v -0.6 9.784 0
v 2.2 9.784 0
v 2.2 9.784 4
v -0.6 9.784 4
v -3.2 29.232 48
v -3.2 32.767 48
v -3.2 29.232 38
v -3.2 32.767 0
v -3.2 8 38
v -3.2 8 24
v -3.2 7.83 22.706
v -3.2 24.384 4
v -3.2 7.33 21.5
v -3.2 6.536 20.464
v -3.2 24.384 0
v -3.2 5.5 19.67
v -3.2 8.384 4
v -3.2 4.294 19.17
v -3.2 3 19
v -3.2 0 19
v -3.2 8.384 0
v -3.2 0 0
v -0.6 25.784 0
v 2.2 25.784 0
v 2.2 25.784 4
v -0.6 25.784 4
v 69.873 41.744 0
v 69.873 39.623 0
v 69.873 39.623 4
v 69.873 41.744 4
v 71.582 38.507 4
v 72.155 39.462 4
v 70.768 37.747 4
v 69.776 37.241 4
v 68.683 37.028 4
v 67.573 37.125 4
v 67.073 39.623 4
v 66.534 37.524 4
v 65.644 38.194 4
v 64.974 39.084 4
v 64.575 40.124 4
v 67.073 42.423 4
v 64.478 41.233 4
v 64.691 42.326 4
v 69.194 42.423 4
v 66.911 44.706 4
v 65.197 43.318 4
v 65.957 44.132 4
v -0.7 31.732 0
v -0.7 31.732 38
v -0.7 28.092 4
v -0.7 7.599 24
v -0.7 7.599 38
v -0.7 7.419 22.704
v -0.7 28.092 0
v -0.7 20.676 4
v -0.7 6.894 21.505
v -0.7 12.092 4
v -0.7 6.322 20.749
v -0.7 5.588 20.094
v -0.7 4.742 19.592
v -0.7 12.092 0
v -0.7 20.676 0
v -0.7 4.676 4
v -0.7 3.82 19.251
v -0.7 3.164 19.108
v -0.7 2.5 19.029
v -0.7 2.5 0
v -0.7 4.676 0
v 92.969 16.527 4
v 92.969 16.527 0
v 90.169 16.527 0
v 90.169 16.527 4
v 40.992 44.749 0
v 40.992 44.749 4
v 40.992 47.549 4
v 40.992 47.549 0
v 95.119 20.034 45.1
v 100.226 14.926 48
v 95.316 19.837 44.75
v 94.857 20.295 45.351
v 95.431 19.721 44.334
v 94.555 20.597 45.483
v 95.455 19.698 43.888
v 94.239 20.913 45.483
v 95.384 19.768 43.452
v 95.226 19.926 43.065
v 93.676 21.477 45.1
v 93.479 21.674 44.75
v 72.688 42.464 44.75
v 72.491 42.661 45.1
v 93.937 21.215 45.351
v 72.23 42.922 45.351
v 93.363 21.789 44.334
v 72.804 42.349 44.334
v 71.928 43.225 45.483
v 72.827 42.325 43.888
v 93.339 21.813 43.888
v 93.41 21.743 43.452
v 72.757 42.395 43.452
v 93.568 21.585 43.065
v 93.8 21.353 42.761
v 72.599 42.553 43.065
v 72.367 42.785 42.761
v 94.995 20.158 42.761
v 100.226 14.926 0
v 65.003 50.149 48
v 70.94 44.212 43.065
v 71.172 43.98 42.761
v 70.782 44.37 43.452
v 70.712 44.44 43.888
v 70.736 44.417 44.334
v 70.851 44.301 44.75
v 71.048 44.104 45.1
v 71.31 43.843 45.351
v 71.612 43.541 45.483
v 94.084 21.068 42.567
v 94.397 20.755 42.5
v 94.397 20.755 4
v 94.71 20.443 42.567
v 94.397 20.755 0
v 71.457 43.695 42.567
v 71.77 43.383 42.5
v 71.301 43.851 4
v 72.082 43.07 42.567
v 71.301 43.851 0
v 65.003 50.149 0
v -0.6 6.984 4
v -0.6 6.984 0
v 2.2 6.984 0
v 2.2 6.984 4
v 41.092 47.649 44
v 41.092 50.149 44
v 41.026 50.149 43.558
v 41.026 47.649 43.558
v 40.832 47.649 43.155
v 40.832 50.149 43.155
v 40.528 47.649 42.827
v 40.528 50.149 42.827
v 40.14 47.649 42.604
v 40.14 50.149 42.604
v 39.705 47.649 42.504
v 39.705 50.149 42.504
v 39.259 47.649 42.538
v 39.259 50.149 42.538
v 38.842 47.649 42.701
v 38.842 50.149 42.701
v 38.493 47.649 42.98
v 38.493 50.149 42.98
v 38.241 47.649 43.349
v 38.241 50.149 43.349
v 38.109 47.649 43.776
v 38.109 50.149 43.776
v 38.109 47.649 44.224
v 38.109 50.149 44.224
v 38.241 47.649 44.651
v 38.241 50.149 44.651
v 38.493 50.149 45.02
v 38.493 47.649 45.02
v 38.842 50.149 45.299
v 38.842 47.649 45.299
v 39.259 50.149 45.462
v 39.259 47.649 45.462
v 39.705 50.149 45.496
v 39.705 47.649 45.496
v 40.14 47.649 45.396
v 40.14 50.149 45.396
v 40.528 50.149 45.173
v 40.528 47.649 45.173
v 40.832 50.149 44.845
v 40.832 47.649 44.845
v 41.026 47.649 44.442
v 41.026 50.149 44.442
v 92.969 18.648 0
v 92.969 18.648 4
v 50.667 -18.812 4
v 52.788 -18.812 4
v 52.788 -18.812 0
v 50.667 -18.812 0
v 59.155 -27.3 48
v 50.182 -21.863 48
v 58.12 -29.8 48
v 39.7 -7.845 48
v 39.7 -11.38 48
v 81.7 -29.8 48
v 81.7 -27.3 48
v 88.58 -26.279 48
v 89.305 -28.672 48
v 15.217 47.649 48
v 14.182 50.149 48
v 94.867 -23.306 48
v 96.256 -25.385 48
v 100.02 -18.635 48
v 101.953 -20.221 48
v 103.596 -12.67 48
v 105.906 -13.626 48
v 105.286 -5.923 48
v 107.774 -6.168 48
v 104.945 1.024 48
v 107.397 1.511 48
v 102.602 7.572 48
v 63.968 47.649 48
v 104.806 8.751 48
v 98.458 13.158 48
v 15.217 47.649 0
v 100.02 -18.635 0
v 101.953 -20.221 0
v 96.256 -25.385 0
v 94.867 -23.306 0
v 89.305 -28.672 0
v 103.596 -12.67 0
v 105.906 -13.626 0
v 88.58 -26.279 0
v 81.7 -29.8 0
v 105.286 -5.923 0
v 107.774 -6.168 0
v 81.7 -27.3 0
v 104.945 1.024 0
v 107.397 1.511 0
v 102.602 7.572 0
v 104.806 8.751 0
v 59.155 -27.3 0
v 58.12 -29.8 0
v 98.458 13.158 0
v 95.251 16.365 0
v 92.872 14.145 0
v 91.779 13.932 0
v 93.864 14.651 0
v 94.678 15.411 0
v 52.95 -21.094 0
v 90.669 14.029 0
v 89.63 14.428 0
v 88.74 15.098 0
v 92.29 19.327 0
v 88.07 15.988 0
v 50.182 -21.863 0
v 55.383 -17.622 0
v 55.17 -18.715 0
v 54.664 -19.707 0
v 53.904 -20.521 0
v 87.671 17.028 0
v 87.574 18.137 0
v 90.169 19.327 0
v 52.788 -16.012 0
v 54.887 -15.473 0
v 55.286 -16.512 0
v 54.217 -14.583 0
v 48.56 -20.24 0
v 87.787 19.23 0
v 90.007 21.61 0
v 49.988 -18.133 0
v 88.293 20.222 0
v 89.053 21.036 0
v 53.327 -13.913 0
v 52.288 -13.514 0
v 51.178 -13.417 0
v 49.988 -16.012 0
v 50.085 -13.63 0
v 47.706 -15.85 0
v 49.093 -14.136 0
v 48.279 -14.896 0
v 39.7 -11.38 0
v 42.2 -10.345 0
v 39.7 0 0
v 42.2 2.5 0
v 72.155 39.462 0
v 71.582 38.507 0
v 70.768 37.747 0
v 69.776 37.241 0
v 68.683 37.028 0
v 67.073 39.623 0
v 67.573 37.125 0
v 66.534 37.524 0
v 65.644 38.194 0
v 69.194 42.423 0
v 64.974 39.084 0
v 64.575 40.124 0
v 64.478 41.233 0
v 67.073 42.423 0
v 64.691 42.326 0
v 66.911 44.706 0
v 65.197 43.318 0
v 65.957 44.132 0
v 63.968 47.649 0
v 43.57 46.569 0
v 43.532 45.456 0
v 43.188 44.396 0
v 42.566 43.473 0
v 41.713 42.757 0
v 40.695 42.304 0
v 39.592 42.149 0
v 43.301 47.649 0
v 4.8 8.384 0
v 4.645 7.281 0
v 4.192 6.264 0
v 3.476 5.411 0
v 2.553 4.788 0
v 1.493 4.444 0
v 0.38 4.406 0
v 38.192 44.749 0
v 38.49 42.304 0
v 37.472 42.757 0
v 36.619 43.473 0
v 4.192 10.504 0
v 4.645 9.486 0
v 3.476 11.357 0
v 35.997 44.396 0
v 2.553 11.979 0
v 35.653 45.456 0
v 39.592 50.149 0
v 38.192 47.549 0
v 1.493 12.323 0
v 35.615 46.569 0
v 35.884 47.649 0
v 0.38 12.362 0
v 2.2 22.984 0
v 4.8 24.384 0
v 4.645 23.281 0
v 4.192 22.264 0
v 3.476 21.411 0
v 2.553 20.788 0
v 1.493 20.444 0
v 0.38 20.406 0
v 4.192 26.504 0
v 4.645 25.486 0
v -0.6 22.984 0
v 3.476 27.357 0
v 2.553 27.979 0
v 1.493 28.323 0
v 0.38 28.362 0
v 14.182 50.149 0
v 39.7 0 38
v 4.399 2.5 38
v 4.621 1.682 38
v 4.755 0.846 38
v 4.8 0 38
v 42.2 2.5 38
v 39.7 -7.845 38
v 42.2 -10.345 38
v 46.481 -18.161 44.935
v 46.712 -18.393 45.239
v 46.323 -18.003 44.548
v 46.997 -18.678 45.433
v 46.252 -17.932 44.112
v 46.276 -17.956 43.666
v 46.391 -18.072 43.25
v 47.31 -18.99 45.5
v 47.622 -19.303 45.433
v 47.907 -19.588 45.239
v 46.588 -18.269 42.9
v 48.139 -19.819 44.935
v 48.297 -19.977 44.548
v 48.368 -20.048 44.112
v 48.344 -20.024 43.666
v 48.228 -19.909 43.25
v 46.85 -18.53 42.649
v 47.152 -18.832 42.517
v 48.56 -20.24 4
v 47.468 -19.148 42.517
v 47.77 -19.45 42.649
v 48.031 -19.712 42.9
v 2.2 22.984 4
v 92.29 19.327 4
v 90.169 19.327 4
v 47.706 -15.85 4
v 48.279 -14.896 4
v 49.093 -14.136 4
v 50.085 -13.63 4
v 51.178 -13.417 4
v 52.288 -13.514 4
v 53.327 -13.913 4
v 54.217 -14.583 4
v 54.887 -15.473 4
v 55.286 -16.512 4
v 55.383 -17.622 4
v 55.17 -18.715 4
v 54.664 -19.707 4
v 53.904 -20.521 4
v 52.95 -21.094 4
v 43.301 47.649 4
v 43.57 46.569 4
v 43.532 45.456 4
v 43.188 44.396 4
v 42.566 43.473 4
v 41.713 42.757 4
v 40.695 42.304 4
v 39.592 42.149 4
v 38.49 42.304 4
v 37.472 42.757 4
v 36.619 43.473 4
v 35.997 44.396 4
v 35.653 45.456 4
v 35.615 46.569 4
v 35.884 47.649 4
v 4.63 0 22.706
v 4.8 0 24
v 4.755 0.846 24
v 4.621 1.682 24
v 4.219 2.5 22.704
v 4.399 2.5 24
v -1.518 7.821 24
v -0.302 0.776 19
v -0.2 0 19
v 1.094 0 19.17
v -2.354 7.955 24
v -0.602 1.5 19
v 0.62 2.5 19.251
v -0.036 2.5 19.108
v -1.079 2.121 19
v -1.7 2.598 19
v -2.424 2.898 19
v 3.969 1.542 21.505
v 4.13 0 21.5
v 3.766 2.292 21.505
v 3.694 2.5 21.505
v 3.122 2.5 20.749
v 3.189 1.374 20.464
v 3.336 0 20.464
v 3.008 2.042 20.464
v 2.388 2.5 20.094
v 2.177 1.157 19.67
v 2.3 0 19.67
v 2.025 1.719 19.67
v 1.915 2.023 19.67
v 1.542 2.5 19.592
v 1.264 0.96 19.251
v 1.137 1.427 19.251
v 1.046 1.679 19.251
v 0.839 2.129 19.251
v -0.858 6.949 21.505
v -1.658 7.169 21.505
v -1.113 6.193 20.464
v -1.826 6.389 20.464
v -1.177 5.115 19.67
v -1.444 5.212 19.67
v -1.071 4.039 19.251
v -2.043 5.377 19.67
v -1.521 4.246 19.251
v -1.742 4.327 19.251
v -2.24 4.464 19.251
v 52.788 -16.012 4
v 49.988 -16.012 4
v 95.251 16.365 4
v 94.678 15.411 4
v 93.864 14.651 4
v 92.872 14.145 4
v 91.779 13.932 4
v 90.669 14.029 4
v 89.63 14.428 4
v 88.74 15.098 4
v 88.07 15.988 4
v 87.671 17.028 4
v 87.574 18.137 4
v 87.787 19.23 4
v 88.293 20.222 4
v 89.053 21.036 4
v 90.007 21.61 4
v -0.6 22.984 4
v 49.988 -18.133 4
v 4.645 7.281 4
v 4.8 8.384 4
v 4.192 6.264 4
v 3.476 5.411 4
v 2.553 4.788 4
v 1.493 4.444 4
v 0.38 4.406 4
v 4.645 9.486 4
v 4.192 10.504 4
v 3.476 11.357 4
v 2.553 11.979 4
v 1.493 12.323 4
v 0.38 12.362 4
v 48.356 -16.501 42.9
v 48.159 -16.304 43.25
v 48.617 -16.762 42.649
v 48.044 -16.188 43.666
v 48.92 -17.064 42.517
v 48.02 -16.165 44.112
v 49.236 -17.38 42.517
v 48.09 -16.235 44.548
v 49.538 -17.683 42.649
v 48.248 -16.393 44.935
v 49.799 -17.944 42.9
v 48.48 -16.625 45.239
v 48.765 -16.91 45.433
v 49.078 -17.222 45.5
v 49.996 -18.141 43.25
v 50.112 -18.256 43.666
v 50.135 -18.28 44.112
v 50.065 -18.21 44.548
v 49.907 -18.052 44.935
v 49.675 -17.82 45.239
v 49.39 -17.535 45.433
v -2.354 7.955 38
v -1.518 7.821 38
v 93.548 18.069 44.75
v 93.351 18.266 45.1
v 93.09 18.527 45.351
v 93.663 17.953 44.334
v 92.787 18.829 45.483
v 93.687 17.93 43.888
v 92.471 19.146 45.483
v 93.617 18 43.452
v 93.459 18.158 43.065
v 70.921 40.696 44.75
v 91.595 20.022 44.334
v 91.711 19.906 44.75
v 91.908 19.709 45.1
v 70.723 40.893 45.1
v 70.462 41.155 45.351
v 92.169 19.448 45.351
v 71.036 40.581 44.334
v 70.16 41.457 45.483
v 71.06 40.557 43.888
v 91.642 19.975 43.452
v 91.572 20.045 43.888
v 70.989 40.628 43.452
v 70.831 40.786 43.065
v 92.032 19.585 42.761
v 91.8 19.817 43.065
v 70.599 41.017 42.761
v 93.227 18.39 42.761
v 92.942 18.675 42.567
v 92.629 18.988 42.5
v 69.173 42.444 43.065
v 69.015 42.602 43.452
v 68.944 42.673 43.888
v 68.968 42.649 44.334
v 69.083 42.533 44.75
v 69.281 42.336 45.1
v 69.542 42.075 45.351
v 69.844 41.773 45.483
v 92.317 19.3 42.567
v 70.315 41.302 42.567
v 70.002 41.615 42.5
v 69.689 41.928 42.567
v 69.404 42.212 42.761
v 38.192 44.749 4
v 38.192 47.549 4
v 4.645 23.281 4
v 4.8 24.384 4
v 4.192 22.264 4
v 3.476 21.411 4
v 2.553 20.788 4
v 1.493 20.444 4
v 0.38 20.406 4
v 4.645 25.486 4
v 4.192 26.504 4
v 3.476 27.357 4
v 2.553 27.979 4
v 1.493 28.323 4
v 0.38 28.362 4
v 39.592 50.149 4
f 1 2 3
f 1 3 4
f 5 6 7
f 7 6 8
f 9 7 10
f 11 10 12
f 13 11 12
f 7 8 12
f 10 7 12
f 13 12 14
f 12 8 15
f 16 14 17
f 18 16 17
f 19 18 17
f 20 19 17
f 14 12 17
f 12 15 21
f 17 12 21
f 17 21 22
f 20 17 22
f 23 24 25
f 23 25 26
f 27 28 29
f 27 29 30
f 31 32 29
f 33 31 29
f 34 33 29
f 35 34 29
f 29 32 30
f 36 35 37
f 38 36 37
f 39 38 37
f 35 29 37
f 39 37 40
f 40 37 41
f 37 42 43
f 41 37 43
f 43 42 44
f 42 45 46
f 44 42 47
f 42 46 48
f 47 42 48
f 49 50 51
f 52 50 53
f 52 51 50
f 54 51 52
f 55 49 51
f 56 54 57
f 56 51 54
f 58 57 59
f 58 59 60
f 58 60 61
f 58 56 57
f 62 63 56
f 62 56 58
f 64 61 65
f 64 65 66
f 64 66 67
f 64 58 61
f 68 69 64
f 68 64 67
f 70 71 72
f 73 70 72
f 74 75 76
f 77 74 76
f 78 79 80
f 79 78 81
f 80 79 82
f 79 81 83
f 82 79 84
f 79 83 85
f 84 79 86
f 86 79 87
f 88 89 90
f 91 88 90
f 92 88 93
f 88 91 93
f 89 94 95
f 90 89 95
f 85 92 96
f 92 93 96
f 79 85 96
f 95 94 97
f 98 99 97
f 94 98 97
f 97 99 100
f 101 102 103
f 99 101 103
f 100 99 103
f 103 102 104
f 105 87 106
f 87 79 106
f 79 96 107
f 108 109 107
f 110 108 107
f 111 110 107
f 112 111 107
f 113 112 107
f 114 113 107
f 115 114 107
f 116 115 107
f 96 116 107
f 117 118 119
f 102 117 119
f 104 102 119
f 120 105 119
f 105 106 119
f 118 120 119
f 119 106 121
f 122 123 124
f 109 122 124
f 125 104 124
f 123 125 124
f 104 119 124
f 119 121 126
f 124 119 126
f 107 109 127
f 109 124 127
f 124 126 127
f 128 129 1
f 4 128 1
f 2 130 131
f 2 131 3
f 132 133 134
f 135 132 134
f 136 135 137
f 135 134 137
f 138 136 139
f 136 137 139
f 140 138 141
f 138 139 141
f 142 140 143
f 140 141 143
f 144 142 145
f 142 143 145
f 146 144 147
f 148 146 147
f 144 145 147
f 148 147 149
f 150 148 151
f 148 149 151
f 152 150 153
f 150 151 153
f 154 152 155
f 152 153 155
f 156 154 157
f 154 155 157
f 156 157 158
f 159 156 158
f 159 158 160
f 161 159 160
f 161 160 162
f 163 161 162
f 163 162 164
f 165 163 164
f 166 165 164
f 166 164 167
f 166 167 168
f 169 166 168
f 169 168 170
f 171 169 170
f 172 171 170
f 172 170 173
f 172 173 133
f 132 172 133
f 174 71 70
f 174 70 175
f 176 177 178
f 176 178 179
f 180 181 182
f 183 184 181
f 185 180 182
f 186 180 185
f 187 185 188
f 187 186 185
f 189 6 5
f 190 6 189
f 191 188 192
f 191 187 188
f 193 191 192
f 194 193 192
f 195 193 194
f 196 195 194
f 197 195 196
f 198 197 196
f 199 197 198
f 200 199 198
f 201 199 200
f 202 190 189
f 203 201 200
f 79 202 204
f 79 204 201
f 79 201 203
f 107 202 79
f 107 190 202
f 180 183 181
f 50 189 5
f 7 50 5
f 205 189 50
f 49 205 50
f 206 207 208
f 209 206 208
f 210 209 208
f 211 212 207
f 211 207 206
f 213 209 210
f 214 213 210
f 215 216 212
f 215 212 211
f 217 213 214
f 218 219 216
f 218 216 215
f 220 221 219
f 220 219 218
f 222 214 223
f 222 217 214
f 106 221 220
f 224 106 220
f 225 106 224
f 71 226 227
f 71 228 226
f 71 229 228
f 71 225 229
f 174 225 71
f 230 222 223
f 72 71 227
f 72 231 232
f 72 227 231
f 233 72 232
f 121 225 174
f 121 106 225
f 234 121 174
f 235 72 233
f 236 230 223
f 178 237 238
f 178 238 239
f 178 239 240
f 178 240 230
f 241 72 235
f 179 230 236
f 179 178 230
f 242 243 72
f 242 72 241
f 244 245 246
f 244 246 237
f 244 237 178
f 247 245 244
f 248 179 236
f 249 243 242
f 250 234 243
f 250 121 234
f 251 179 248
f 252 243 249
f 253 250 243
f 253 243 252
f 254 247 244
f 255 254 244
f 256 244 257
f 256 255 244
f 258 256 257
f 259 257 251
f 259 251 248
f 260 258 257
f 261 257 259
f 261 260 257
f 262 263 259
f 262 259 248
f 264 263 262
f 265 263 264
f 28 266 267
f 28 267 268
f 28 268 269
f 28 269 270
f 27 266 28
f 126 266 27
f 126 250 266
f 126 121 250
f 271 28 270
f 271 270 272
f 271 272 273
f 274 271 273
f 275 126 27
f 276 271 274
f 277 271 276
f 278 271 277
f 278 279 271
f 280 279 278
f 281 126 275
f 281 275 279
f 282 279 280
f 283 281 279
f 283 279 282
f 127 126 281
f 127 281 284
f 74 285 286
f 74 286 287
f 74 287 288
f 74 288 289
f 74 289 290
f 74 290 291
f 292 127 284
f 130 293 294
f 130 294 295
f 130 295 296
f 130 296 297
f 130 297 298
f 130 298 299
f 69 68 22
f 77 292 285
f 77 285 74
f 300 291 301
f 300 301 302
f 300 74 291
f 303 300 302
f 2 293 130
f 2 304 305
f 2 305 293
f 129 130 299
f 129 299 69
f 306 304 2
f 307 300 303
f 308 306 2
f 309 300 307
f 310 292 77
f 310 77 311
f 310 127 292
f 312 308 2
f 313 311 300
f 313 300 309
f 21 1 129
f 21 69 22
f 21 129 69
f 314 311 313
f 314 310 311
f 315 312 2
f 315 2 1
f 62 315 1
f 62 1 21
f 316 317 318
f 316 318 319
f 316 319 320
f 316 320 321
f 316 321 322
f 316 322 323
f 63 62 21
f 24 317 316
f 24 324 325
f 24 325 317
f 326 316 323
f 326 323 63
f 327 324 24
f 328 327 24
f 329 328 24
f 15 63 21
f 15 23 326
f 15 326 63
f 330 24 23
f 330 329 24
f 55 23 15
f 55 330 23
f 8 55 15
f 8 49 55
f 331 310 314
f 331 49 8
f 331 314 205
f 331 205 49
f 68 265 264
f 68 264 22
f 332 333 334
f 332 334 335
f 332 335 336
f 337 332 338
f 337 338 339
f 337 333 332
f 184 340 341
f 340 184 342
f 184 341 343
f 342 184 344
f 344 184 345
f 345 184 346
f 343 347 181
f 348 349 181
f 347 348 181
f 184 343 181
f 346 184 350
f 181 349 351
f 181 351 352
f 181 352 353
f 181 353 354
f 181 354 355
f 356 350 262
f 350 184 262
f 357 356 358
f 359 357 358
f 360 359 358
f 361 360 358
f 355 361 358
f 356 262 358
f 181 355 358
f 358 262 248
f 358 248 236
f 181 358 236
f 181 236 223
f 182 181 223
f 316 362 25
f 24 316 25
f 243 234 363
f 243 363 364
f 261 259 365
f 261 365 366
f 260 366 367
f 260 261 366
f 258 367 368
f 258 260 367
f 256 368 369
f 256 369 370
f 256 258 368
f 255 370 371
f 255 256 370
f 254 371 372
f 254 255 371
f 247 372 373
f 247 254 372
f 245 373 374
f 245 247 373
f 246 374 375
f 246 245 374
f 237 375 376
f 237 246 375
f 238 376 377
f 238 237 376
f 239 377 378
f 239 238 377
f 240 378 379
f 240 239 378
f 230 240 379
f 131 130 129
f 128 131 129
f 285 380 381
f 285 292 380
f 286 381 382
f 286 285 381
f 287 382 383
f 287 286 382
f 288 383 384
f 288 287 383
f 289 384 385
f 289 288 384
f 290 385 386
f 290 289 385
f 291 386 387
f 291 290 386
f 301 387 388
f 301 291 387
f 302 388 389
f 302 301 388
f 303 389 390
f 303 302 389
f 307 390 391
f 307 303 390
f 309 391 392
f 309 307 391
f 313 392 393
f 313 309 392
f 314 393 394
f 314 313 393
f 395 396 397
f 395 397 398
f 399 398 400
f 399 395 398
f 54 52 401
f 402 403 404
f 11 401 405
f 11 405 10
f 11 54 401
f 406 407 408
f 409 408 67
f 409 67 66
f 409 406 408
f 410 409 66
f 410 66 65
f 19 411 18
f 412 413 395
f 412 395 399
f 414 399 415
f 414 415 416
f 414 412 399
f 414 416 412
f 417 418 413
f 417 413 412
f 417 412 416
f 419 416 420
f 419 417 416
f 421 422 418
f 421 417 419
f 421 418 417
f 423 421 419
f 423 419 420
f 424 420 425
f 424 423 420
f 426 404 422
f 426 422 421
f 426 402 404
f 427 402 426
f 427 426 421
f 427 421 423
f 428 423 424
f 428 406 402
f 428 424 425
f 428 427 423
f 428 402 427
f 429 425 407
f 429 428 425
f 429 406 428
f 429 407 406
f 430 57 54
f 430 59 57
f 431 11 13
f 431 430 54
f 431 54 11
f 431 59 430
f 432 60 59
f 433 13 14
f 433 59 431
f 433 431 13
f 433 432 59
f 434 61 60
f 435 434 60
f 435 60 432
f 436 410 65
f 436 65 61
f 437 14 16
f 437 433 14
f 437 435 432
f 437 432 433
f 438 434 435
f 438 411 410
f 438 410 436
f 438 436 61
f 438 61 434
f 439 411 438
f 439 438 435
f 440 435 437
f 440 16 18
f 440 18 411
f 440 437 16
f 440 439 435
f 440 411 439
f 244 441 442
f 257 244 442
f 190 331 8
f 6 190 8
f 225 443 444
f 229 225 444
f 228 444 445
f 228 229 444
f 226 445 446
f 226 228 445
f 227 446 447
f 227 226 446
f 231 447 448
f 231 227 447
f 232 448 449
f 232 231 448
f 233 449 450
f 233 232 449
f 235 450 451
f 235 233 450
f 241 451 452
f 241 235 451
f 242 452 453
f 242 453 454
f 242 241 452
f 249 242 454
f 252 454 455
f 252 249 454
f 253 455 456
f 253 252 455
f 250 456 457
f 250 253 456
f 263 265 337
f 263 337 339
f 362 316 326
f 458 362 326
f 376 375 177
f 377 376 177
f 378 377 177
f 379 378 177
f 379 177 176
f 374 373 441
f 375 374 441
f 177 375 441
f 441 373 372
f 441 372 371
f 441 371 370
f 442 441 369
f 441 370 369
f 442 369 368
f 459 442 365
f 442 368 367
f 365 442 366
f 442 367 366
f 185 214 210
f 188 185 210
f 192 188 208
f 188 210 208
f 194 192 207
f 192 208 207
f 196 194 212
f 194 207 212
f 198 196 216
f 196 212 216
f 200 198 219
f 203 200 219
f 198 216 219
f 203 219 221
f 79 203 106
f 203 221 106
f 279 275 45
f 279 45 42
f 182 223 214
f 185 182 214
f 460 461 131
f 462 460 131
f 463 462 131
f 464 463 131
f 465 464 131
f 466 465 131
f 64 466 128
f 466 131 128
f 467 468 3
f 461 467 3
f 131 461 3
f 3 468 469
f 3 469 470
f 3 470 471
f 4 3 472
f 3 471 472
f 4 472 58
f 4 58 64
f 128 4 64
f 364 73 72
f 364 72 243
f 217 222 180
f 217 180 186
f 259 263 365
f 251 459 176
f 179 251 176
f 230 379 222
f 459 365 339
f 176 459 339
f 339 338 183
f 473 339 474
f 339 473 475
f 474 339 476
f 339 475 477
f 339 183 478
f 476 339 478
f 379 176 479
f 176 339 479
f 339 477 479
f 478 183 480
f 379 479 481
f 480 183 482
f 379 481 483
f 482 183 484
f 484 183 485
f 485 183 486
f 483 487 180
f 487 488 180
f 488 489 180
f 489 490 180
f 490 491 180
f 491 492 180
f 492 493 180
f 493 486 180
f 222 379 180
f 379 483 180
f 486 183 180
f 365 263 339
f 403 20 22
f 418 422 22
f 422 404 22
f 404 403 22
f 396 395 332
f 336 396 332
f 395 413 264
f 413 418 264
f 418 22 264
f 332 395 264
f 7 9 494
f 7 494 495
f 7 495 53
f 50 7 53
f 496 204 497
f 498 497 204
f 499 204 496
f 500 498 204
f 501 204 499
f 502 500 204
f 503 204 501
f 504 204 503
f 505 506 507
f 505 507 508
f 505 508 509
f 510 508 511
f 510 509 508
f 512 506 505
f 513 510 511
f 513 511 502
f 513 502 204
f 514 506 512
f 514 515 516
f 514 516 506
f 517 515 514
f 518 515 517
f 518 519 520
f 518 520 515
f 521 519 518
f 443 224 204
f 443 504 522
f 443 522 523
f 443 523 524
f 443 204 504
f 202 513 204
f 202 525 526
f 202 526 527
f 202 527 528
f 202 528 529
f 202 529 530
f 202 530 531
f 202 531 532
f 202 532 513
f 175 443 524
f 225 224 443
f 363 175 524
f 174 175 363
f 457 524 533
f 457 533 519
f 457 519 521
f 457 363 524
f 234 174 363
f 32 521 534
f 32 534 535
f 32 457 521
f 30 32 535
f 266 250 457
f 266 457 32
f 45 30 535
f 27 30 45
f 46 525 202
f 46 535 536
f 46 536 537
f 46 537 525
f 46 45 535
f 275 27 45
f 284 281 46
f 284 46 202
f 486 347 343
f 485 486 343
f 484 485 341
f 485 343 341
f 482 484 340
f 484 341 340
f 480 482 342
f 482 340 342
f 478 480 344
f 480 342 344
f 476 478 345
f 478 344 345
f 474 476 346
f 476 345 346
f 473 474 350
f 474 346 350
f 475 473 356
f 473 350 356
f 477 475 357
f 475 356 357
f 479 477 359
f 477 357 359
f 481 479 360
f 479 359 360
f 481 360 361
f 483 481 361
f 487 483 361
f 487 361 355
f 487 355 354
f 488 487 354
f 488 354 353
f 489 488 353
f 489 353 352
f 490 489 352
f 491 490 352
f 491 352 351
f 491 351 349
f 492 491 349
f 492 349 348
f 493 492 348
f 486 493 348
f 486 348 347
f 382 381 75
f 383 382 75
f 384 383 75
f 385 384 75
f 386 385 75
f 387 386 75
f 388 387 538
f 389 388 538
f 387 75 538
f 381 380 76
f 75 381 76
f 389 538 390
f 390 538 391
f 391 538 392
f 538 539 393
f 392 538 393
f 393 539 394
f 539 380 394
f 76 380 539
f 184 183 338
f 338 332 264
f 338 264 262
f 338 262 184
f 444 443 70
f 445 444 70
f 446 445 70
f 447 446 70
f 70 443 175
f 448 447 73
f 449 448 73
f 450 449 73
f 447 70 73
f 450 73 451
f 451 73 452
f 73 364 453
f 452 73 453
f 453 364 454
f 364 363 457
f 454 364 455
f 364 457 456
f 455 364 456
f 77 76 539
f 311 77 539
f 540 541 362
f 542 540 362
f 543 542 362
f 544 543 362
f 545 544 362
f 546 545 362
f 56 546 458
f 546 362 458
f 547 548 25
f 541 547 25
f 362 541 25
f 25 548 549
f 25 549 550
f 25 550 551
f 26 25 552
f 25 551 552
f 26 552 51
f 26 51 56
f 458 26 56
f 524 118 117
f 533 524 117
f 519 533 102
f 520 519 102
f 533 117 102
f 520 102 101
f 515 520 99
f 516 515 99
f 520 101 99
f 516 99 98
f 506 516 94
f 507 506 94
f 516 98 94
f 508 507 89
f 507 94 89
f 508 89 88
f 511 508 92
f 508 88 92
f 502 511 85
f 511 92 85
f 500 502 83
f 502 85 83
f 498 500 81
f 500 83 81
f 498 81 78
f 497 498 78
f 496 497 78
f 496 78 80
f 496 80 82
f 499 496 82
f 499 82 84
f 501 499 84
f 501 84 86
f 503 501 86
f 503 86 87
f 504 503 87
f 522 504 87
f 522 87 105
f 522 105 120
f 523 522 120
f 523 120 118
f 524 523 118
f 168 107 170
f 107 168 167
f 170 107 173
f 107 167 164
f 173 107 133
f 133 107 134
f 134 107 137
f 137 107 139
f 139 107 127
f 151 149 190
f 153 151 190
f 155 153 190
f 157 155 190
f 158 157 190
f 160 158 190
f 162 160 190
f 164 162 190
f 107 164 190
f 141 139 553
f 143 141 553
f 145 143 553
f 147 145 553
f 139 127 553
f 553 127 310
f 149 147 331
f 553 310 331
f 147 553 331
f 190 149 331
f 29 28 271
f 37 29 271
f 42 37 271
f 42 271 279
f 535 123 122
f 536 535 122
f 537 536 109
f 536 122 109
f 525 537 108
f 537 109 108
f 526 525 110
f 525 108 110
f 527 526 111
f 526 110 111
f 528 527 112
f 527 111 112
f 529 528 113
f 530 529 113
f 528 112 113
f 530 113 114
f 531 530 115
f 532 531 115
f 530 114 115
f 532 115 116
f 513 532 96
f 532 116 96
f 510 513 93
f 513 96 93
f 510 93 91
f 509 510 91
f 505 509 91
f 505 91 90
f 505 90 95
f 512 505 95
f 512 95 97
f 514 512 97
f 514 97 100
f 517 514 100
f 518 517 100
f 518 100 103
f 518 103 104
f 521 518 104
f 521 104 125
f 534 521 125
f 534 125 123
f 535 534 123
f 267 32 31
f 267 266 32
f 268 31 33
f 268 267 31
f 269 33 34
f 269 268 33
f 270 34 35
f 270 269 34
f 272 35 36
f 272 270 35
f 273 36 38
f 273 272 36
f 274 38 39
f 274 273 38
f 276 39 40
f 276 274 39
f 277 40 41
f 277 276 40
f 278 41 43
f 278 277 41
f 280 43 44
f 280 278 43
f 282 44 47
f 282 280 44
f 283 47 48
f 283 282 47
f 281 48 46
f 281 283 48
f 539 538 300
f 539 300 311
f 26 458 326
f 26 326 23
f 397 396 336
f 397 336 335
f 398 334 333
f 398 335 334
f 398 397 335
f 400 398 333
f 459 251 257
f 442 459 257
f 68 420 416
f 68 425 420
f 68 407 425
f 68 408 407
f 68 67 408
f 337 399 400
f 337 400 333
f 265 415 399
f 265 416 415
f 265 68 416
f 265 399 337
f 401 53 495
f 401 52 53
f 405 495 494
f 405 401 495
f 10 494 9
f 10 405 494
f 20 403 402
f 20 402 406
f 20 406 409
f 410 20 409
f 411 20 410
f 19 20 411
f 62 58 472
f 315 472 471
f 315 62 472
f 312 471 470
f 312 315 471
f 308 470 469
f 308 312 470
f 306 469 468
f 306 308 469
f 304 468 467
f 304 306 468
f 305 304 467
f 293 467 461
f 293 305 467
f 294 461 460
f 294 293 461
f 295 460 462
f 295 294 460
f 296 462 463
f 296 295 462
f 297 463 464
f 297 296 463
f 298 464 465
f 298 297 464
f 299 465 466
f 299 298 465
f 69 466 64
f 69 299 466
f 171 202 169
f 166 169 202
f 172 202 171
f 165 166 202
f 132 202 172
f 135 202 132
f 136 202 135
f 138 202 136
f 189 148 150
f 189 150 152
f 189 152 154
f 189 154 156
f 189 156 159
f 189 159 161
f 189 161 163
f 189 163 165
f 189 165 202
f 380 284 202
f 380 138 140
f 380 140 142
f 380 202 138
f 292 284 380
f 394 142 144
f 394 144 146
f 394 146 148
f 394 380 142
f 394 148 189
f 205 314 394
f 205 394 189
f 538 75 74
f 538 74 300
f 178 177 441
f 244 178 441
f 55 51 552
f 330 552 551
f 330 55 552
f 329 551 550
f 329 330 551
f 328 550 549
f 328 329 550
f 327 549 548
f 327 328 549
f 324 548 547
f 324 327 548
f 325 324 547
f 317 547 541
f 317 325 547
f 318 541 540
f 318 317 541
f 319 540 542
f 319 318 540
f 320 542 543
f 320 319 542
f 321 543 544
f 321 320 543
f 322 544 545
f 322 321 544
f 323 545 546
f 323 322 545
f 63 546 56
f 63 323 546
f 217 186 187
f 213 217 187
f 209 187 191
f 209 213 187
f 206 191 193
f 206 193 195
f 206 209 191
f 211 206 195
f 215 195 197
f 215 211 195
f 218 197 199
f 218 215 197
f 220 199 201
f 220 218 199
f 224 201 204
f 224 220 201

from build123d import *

# Parameters (mm, degrees)
RESSALTO_EXTRUS_O1_DEPTH = 48
ESBO_O12_R               = 1.5
CORTE_EXTRUS_O10_DEPTH   = 10
ESBO_O13_R               = 1.5
CORTE_EXTRUS_O11_DEPTH   = 10
ESBO_O14_R               = 1.5
CORTE_EXTRUS_O12_DEPTH   = 10
ESBO_O15_R               = 1.5
CORTE_EXTRUS_O13_DEPTH   = 10
CORTE_EXTRUS_O14_DEPTH   = 10
ESBO_O17_R               = 4
ESBO_O17_W               = 2.8
ESBO_O17_H               = 2.8
RESSALTO_EXTRUS_O2_DEPTH = 4
CORTE_EXTRUS_O15_DEPTH   = 10


with BuildPart() as part:
    # Model → Ressalto-extrusão1 (new body)
    with BuildSketch(Plane.XY):
        with BuildLine():
            Line((-0.7, 0), (39, 0))
            Line((39, 0), (39.7, 0))
            Line((39.7, 0), (39.7, -11.380317396))
            Line((39.7, -11.380317396), (50.182424304, -21.8627417))
            Line((50.182424304, -21.8627417), (58.119682605, -29.8))
            Line((58.119682605, -29.8), (81.7, -29.8))
            ThreePointArc((81.7, -29.8), (105.905643752, -13.626305928), (100.226197667, 14.926197667))
            Line((100.226197667, 14.926197667), (65.00338056, 50.149014774))
            Line((65.00338056, 50.149014774), (50.111140335, 50.149014774))
            Line((50.111140335, 50.149014774), (14.181595121, 50.149014774))
            Line((14.181595121, 50.149014774), (-3.2, 32.767419653))
            Line((-3.2, 32.767419653), (-3.2, 5))
            Line((-3.2, 5), (-3.2, 0))
            Line((-3.2, 0), (-0.7, 0))
        make_face()
        with BuildLine():
            Line((-0.7, 2.5), (39, 2.5))
            Line((39, 2.5), (39.7, 2.5))
            Line((39.7, 2.5), (42.2, 2.5))
            Line((42.2, 2.5), (42.2, -10.34478349))
            Line((42.2, -10.34478349), (51.950191257, -20.094974747))
            Line((51.950191257, -20.094974747), (59.15521651, -27.3))
            Line((59.15521651, -27.3), (81.7, -27.3))
            ThreePointArc((81.7, -27.3), (103.595944921, -12.669597347), (98.458430714, 13.158430714))
            Line((98.458430714, 13.158430714), (63.967846654, 47.649014774))
            Line((63.967846654, 47.649014774), (50.111140335, 47.649014774))
            Line((50.111140335, 47.649014774), (15.217129027, 47.649014774))
            Line((15.217129027, 47.649014774), (-0.7, 31.731885747))
            Line((-0.7, 31.731885747), (-0.7, 2.5))
        make_face(mode=Mode.SUBTRACT)
    extrude(amount=RESSALTO_EXTRUS_O1_DEPTH)

    # Esboço12 → Corte-extrusão10 (cut)
    with BuildSketch(Plane(origin=(57.576197667, 57.576197667, 0), x_dir=(0, 0, -1), z_dir=(0.707106781, 0.707106781, 0))):
        with Locations((-44, -20.072657306)):
            Circle(ESBO_O12_R)
        with Locations((-44, -52.072657306)):
            Circle(ESBO_O12_R)
    extrude(amount=-CORTE_EXTRUS_O10_DEPTH, mode=Mode.SUBTRACT)

    # Esboço13 → Corte-extrusão11 (cut)
    with BuildSketch(Plane(origin=(0, 50.149014774, 0), x_dir=(1, 0, 0), z_dir=(0, 1, 0))):
        with Locations((39.59248784, -44)):
            Circle(ESBO_O13_R)
    extrude(amount=-CORTE_EXTRUS_O11_DEPTH, mode=Mode.SUBTRACT)

    # Esboço14 → Corte-extrusão12 (cut)
    with BuildSketch(Plane.ZY.offset(3.2)):
        with Locations((44, 23.701037279)):
            Circle(ESBO_O14_R)
        with Locations((44, 7.740898975)):
            Circle(ESBO_O14_R)
    extrude(amount=-CORTE_EXTRUS_O12_DEPTH, mode=Mode.SUBTRACT)

    # Esboço15 → Corte-extrusão13 (cut)
    with BuildSketch(Plane(origin=(14.159841302, 14.159841302, 0), x_dir=(0, 0, 1), z_dir=(-0.707106781, -0.707106781, 0))):
        with Locations((44, -46.881179593)):
            Circle(ESBO_O15_R)
    extrude(amount=-CORTE_EXTRUS_O13_DEPTH, mode=Mode.SUBTRACT)

    # Esboço16 → Corte-extrusão14 (cut)
    with BuildSketch(Plane.XY.offset(48)):
        Polygon((39.7, 0), (39.7, -7.84478349), (42.2, -10.34478349), (42.2, 2.5), (-0.7, 2.5), (-0.7, 0), align=None)
    extrude(amount=-CORTE_EXTRUS_O14_DEPTH, mode=Mode.SUBTRACT)

    # Esboço17 → Ressalto-extrusão2 (add)
    with BuildSketch(Plane(origin=(0, 0, 0), x_dir=(-1, 0, 0), z_dir=(0, 0, -1))):
        with Locations((-91.568699638, 17.926841447)):
            Circle(ESBO_O17_R)
        with Locations((-91.568699638, 17.926841447)):
            Rectangle(ESBO_O17_W, ESBO_O17_H, mode=Mode.SUBTRACT)
        with Locations((-68.47265349, 41.022887595)):
            Circle(ESBO_O17_R)
        with Locations((-68.47265349, 41.022887595)):
            Rectangle(ESBO_O17_W, ESBO_O17_H, mode=Mode.SUBTRACT)
        with Locations((-39.59248784, 46.149014774)):
            Circle(ESBO_O17_R)
        with Locations((-39.59248784, 46.149014774)):
            Rectangle(ESBO_O17_W, ESBO_O17_H, mode=Mode.SUBTRACT)
        with Locations((-0.8, 24.383709827)):
            Circle(ESBO_O17_R)
        with Locations((-0.8, 24.383709827)):
            Rectangle(ESBO_O17_W, ESBO_O17_H, mode=Mode.SUBTRACT)
        with Locations((-0.8, 8.383709827)):
            Circle(ESBO_O17_R)
        with Locations((-0.8, 8.383709827)):
            Rectangle(ESBO_O17_W, ESBO_O17_H, mode=Mode.SUBTRACT)
        with Locations((-51.388268427, -17.411731573)):
            Circle(ESBO_O17_R)
        with Locations((-51.388268427, -17.411731573)):
            Rectangle(ESBO_O17_W, ESBO_O17_H, mode=Mode.SUBTRACT)
    extrude(amount=-RESSALTO_EXTRUS_O2_DEPTH)

    # Esboço18 → Corte-extrusão15 (cut)
    with BuildSketch(Plane.XY.offset(48)):
        Polygon((-0.7, 31.731885747), (-32.431885747, 0), (-0.7, 0), align=None)
    extrude(amount=-CORTE_EXTRUS_O15_DEPTH, mode=Mode.SUBTRACT)

    # Esboço19 → Corte-Revolução1 (revolve, cut)
    with BuildSketch(Plane.ZY.offset(3.2)):
        with BuildLine():
            Line((19, 0), (29, 0))
            Line((29, 0), (38.25689259, 0))
            Line((38.25689259, 0), (38.25689259, 8))
            Line((38.25689259, 8), (24, 8))
            ThreePointArc((24, 8), (20.464466094, 6.535533906), (19, 3))
            Line((19, 3), (19, 0))
        make_face()
    revolve(axis=Axis((-3.2, 0, 19), (0, 0, 1)), mode=Mode.SUBTRACT)


solid = part.part
